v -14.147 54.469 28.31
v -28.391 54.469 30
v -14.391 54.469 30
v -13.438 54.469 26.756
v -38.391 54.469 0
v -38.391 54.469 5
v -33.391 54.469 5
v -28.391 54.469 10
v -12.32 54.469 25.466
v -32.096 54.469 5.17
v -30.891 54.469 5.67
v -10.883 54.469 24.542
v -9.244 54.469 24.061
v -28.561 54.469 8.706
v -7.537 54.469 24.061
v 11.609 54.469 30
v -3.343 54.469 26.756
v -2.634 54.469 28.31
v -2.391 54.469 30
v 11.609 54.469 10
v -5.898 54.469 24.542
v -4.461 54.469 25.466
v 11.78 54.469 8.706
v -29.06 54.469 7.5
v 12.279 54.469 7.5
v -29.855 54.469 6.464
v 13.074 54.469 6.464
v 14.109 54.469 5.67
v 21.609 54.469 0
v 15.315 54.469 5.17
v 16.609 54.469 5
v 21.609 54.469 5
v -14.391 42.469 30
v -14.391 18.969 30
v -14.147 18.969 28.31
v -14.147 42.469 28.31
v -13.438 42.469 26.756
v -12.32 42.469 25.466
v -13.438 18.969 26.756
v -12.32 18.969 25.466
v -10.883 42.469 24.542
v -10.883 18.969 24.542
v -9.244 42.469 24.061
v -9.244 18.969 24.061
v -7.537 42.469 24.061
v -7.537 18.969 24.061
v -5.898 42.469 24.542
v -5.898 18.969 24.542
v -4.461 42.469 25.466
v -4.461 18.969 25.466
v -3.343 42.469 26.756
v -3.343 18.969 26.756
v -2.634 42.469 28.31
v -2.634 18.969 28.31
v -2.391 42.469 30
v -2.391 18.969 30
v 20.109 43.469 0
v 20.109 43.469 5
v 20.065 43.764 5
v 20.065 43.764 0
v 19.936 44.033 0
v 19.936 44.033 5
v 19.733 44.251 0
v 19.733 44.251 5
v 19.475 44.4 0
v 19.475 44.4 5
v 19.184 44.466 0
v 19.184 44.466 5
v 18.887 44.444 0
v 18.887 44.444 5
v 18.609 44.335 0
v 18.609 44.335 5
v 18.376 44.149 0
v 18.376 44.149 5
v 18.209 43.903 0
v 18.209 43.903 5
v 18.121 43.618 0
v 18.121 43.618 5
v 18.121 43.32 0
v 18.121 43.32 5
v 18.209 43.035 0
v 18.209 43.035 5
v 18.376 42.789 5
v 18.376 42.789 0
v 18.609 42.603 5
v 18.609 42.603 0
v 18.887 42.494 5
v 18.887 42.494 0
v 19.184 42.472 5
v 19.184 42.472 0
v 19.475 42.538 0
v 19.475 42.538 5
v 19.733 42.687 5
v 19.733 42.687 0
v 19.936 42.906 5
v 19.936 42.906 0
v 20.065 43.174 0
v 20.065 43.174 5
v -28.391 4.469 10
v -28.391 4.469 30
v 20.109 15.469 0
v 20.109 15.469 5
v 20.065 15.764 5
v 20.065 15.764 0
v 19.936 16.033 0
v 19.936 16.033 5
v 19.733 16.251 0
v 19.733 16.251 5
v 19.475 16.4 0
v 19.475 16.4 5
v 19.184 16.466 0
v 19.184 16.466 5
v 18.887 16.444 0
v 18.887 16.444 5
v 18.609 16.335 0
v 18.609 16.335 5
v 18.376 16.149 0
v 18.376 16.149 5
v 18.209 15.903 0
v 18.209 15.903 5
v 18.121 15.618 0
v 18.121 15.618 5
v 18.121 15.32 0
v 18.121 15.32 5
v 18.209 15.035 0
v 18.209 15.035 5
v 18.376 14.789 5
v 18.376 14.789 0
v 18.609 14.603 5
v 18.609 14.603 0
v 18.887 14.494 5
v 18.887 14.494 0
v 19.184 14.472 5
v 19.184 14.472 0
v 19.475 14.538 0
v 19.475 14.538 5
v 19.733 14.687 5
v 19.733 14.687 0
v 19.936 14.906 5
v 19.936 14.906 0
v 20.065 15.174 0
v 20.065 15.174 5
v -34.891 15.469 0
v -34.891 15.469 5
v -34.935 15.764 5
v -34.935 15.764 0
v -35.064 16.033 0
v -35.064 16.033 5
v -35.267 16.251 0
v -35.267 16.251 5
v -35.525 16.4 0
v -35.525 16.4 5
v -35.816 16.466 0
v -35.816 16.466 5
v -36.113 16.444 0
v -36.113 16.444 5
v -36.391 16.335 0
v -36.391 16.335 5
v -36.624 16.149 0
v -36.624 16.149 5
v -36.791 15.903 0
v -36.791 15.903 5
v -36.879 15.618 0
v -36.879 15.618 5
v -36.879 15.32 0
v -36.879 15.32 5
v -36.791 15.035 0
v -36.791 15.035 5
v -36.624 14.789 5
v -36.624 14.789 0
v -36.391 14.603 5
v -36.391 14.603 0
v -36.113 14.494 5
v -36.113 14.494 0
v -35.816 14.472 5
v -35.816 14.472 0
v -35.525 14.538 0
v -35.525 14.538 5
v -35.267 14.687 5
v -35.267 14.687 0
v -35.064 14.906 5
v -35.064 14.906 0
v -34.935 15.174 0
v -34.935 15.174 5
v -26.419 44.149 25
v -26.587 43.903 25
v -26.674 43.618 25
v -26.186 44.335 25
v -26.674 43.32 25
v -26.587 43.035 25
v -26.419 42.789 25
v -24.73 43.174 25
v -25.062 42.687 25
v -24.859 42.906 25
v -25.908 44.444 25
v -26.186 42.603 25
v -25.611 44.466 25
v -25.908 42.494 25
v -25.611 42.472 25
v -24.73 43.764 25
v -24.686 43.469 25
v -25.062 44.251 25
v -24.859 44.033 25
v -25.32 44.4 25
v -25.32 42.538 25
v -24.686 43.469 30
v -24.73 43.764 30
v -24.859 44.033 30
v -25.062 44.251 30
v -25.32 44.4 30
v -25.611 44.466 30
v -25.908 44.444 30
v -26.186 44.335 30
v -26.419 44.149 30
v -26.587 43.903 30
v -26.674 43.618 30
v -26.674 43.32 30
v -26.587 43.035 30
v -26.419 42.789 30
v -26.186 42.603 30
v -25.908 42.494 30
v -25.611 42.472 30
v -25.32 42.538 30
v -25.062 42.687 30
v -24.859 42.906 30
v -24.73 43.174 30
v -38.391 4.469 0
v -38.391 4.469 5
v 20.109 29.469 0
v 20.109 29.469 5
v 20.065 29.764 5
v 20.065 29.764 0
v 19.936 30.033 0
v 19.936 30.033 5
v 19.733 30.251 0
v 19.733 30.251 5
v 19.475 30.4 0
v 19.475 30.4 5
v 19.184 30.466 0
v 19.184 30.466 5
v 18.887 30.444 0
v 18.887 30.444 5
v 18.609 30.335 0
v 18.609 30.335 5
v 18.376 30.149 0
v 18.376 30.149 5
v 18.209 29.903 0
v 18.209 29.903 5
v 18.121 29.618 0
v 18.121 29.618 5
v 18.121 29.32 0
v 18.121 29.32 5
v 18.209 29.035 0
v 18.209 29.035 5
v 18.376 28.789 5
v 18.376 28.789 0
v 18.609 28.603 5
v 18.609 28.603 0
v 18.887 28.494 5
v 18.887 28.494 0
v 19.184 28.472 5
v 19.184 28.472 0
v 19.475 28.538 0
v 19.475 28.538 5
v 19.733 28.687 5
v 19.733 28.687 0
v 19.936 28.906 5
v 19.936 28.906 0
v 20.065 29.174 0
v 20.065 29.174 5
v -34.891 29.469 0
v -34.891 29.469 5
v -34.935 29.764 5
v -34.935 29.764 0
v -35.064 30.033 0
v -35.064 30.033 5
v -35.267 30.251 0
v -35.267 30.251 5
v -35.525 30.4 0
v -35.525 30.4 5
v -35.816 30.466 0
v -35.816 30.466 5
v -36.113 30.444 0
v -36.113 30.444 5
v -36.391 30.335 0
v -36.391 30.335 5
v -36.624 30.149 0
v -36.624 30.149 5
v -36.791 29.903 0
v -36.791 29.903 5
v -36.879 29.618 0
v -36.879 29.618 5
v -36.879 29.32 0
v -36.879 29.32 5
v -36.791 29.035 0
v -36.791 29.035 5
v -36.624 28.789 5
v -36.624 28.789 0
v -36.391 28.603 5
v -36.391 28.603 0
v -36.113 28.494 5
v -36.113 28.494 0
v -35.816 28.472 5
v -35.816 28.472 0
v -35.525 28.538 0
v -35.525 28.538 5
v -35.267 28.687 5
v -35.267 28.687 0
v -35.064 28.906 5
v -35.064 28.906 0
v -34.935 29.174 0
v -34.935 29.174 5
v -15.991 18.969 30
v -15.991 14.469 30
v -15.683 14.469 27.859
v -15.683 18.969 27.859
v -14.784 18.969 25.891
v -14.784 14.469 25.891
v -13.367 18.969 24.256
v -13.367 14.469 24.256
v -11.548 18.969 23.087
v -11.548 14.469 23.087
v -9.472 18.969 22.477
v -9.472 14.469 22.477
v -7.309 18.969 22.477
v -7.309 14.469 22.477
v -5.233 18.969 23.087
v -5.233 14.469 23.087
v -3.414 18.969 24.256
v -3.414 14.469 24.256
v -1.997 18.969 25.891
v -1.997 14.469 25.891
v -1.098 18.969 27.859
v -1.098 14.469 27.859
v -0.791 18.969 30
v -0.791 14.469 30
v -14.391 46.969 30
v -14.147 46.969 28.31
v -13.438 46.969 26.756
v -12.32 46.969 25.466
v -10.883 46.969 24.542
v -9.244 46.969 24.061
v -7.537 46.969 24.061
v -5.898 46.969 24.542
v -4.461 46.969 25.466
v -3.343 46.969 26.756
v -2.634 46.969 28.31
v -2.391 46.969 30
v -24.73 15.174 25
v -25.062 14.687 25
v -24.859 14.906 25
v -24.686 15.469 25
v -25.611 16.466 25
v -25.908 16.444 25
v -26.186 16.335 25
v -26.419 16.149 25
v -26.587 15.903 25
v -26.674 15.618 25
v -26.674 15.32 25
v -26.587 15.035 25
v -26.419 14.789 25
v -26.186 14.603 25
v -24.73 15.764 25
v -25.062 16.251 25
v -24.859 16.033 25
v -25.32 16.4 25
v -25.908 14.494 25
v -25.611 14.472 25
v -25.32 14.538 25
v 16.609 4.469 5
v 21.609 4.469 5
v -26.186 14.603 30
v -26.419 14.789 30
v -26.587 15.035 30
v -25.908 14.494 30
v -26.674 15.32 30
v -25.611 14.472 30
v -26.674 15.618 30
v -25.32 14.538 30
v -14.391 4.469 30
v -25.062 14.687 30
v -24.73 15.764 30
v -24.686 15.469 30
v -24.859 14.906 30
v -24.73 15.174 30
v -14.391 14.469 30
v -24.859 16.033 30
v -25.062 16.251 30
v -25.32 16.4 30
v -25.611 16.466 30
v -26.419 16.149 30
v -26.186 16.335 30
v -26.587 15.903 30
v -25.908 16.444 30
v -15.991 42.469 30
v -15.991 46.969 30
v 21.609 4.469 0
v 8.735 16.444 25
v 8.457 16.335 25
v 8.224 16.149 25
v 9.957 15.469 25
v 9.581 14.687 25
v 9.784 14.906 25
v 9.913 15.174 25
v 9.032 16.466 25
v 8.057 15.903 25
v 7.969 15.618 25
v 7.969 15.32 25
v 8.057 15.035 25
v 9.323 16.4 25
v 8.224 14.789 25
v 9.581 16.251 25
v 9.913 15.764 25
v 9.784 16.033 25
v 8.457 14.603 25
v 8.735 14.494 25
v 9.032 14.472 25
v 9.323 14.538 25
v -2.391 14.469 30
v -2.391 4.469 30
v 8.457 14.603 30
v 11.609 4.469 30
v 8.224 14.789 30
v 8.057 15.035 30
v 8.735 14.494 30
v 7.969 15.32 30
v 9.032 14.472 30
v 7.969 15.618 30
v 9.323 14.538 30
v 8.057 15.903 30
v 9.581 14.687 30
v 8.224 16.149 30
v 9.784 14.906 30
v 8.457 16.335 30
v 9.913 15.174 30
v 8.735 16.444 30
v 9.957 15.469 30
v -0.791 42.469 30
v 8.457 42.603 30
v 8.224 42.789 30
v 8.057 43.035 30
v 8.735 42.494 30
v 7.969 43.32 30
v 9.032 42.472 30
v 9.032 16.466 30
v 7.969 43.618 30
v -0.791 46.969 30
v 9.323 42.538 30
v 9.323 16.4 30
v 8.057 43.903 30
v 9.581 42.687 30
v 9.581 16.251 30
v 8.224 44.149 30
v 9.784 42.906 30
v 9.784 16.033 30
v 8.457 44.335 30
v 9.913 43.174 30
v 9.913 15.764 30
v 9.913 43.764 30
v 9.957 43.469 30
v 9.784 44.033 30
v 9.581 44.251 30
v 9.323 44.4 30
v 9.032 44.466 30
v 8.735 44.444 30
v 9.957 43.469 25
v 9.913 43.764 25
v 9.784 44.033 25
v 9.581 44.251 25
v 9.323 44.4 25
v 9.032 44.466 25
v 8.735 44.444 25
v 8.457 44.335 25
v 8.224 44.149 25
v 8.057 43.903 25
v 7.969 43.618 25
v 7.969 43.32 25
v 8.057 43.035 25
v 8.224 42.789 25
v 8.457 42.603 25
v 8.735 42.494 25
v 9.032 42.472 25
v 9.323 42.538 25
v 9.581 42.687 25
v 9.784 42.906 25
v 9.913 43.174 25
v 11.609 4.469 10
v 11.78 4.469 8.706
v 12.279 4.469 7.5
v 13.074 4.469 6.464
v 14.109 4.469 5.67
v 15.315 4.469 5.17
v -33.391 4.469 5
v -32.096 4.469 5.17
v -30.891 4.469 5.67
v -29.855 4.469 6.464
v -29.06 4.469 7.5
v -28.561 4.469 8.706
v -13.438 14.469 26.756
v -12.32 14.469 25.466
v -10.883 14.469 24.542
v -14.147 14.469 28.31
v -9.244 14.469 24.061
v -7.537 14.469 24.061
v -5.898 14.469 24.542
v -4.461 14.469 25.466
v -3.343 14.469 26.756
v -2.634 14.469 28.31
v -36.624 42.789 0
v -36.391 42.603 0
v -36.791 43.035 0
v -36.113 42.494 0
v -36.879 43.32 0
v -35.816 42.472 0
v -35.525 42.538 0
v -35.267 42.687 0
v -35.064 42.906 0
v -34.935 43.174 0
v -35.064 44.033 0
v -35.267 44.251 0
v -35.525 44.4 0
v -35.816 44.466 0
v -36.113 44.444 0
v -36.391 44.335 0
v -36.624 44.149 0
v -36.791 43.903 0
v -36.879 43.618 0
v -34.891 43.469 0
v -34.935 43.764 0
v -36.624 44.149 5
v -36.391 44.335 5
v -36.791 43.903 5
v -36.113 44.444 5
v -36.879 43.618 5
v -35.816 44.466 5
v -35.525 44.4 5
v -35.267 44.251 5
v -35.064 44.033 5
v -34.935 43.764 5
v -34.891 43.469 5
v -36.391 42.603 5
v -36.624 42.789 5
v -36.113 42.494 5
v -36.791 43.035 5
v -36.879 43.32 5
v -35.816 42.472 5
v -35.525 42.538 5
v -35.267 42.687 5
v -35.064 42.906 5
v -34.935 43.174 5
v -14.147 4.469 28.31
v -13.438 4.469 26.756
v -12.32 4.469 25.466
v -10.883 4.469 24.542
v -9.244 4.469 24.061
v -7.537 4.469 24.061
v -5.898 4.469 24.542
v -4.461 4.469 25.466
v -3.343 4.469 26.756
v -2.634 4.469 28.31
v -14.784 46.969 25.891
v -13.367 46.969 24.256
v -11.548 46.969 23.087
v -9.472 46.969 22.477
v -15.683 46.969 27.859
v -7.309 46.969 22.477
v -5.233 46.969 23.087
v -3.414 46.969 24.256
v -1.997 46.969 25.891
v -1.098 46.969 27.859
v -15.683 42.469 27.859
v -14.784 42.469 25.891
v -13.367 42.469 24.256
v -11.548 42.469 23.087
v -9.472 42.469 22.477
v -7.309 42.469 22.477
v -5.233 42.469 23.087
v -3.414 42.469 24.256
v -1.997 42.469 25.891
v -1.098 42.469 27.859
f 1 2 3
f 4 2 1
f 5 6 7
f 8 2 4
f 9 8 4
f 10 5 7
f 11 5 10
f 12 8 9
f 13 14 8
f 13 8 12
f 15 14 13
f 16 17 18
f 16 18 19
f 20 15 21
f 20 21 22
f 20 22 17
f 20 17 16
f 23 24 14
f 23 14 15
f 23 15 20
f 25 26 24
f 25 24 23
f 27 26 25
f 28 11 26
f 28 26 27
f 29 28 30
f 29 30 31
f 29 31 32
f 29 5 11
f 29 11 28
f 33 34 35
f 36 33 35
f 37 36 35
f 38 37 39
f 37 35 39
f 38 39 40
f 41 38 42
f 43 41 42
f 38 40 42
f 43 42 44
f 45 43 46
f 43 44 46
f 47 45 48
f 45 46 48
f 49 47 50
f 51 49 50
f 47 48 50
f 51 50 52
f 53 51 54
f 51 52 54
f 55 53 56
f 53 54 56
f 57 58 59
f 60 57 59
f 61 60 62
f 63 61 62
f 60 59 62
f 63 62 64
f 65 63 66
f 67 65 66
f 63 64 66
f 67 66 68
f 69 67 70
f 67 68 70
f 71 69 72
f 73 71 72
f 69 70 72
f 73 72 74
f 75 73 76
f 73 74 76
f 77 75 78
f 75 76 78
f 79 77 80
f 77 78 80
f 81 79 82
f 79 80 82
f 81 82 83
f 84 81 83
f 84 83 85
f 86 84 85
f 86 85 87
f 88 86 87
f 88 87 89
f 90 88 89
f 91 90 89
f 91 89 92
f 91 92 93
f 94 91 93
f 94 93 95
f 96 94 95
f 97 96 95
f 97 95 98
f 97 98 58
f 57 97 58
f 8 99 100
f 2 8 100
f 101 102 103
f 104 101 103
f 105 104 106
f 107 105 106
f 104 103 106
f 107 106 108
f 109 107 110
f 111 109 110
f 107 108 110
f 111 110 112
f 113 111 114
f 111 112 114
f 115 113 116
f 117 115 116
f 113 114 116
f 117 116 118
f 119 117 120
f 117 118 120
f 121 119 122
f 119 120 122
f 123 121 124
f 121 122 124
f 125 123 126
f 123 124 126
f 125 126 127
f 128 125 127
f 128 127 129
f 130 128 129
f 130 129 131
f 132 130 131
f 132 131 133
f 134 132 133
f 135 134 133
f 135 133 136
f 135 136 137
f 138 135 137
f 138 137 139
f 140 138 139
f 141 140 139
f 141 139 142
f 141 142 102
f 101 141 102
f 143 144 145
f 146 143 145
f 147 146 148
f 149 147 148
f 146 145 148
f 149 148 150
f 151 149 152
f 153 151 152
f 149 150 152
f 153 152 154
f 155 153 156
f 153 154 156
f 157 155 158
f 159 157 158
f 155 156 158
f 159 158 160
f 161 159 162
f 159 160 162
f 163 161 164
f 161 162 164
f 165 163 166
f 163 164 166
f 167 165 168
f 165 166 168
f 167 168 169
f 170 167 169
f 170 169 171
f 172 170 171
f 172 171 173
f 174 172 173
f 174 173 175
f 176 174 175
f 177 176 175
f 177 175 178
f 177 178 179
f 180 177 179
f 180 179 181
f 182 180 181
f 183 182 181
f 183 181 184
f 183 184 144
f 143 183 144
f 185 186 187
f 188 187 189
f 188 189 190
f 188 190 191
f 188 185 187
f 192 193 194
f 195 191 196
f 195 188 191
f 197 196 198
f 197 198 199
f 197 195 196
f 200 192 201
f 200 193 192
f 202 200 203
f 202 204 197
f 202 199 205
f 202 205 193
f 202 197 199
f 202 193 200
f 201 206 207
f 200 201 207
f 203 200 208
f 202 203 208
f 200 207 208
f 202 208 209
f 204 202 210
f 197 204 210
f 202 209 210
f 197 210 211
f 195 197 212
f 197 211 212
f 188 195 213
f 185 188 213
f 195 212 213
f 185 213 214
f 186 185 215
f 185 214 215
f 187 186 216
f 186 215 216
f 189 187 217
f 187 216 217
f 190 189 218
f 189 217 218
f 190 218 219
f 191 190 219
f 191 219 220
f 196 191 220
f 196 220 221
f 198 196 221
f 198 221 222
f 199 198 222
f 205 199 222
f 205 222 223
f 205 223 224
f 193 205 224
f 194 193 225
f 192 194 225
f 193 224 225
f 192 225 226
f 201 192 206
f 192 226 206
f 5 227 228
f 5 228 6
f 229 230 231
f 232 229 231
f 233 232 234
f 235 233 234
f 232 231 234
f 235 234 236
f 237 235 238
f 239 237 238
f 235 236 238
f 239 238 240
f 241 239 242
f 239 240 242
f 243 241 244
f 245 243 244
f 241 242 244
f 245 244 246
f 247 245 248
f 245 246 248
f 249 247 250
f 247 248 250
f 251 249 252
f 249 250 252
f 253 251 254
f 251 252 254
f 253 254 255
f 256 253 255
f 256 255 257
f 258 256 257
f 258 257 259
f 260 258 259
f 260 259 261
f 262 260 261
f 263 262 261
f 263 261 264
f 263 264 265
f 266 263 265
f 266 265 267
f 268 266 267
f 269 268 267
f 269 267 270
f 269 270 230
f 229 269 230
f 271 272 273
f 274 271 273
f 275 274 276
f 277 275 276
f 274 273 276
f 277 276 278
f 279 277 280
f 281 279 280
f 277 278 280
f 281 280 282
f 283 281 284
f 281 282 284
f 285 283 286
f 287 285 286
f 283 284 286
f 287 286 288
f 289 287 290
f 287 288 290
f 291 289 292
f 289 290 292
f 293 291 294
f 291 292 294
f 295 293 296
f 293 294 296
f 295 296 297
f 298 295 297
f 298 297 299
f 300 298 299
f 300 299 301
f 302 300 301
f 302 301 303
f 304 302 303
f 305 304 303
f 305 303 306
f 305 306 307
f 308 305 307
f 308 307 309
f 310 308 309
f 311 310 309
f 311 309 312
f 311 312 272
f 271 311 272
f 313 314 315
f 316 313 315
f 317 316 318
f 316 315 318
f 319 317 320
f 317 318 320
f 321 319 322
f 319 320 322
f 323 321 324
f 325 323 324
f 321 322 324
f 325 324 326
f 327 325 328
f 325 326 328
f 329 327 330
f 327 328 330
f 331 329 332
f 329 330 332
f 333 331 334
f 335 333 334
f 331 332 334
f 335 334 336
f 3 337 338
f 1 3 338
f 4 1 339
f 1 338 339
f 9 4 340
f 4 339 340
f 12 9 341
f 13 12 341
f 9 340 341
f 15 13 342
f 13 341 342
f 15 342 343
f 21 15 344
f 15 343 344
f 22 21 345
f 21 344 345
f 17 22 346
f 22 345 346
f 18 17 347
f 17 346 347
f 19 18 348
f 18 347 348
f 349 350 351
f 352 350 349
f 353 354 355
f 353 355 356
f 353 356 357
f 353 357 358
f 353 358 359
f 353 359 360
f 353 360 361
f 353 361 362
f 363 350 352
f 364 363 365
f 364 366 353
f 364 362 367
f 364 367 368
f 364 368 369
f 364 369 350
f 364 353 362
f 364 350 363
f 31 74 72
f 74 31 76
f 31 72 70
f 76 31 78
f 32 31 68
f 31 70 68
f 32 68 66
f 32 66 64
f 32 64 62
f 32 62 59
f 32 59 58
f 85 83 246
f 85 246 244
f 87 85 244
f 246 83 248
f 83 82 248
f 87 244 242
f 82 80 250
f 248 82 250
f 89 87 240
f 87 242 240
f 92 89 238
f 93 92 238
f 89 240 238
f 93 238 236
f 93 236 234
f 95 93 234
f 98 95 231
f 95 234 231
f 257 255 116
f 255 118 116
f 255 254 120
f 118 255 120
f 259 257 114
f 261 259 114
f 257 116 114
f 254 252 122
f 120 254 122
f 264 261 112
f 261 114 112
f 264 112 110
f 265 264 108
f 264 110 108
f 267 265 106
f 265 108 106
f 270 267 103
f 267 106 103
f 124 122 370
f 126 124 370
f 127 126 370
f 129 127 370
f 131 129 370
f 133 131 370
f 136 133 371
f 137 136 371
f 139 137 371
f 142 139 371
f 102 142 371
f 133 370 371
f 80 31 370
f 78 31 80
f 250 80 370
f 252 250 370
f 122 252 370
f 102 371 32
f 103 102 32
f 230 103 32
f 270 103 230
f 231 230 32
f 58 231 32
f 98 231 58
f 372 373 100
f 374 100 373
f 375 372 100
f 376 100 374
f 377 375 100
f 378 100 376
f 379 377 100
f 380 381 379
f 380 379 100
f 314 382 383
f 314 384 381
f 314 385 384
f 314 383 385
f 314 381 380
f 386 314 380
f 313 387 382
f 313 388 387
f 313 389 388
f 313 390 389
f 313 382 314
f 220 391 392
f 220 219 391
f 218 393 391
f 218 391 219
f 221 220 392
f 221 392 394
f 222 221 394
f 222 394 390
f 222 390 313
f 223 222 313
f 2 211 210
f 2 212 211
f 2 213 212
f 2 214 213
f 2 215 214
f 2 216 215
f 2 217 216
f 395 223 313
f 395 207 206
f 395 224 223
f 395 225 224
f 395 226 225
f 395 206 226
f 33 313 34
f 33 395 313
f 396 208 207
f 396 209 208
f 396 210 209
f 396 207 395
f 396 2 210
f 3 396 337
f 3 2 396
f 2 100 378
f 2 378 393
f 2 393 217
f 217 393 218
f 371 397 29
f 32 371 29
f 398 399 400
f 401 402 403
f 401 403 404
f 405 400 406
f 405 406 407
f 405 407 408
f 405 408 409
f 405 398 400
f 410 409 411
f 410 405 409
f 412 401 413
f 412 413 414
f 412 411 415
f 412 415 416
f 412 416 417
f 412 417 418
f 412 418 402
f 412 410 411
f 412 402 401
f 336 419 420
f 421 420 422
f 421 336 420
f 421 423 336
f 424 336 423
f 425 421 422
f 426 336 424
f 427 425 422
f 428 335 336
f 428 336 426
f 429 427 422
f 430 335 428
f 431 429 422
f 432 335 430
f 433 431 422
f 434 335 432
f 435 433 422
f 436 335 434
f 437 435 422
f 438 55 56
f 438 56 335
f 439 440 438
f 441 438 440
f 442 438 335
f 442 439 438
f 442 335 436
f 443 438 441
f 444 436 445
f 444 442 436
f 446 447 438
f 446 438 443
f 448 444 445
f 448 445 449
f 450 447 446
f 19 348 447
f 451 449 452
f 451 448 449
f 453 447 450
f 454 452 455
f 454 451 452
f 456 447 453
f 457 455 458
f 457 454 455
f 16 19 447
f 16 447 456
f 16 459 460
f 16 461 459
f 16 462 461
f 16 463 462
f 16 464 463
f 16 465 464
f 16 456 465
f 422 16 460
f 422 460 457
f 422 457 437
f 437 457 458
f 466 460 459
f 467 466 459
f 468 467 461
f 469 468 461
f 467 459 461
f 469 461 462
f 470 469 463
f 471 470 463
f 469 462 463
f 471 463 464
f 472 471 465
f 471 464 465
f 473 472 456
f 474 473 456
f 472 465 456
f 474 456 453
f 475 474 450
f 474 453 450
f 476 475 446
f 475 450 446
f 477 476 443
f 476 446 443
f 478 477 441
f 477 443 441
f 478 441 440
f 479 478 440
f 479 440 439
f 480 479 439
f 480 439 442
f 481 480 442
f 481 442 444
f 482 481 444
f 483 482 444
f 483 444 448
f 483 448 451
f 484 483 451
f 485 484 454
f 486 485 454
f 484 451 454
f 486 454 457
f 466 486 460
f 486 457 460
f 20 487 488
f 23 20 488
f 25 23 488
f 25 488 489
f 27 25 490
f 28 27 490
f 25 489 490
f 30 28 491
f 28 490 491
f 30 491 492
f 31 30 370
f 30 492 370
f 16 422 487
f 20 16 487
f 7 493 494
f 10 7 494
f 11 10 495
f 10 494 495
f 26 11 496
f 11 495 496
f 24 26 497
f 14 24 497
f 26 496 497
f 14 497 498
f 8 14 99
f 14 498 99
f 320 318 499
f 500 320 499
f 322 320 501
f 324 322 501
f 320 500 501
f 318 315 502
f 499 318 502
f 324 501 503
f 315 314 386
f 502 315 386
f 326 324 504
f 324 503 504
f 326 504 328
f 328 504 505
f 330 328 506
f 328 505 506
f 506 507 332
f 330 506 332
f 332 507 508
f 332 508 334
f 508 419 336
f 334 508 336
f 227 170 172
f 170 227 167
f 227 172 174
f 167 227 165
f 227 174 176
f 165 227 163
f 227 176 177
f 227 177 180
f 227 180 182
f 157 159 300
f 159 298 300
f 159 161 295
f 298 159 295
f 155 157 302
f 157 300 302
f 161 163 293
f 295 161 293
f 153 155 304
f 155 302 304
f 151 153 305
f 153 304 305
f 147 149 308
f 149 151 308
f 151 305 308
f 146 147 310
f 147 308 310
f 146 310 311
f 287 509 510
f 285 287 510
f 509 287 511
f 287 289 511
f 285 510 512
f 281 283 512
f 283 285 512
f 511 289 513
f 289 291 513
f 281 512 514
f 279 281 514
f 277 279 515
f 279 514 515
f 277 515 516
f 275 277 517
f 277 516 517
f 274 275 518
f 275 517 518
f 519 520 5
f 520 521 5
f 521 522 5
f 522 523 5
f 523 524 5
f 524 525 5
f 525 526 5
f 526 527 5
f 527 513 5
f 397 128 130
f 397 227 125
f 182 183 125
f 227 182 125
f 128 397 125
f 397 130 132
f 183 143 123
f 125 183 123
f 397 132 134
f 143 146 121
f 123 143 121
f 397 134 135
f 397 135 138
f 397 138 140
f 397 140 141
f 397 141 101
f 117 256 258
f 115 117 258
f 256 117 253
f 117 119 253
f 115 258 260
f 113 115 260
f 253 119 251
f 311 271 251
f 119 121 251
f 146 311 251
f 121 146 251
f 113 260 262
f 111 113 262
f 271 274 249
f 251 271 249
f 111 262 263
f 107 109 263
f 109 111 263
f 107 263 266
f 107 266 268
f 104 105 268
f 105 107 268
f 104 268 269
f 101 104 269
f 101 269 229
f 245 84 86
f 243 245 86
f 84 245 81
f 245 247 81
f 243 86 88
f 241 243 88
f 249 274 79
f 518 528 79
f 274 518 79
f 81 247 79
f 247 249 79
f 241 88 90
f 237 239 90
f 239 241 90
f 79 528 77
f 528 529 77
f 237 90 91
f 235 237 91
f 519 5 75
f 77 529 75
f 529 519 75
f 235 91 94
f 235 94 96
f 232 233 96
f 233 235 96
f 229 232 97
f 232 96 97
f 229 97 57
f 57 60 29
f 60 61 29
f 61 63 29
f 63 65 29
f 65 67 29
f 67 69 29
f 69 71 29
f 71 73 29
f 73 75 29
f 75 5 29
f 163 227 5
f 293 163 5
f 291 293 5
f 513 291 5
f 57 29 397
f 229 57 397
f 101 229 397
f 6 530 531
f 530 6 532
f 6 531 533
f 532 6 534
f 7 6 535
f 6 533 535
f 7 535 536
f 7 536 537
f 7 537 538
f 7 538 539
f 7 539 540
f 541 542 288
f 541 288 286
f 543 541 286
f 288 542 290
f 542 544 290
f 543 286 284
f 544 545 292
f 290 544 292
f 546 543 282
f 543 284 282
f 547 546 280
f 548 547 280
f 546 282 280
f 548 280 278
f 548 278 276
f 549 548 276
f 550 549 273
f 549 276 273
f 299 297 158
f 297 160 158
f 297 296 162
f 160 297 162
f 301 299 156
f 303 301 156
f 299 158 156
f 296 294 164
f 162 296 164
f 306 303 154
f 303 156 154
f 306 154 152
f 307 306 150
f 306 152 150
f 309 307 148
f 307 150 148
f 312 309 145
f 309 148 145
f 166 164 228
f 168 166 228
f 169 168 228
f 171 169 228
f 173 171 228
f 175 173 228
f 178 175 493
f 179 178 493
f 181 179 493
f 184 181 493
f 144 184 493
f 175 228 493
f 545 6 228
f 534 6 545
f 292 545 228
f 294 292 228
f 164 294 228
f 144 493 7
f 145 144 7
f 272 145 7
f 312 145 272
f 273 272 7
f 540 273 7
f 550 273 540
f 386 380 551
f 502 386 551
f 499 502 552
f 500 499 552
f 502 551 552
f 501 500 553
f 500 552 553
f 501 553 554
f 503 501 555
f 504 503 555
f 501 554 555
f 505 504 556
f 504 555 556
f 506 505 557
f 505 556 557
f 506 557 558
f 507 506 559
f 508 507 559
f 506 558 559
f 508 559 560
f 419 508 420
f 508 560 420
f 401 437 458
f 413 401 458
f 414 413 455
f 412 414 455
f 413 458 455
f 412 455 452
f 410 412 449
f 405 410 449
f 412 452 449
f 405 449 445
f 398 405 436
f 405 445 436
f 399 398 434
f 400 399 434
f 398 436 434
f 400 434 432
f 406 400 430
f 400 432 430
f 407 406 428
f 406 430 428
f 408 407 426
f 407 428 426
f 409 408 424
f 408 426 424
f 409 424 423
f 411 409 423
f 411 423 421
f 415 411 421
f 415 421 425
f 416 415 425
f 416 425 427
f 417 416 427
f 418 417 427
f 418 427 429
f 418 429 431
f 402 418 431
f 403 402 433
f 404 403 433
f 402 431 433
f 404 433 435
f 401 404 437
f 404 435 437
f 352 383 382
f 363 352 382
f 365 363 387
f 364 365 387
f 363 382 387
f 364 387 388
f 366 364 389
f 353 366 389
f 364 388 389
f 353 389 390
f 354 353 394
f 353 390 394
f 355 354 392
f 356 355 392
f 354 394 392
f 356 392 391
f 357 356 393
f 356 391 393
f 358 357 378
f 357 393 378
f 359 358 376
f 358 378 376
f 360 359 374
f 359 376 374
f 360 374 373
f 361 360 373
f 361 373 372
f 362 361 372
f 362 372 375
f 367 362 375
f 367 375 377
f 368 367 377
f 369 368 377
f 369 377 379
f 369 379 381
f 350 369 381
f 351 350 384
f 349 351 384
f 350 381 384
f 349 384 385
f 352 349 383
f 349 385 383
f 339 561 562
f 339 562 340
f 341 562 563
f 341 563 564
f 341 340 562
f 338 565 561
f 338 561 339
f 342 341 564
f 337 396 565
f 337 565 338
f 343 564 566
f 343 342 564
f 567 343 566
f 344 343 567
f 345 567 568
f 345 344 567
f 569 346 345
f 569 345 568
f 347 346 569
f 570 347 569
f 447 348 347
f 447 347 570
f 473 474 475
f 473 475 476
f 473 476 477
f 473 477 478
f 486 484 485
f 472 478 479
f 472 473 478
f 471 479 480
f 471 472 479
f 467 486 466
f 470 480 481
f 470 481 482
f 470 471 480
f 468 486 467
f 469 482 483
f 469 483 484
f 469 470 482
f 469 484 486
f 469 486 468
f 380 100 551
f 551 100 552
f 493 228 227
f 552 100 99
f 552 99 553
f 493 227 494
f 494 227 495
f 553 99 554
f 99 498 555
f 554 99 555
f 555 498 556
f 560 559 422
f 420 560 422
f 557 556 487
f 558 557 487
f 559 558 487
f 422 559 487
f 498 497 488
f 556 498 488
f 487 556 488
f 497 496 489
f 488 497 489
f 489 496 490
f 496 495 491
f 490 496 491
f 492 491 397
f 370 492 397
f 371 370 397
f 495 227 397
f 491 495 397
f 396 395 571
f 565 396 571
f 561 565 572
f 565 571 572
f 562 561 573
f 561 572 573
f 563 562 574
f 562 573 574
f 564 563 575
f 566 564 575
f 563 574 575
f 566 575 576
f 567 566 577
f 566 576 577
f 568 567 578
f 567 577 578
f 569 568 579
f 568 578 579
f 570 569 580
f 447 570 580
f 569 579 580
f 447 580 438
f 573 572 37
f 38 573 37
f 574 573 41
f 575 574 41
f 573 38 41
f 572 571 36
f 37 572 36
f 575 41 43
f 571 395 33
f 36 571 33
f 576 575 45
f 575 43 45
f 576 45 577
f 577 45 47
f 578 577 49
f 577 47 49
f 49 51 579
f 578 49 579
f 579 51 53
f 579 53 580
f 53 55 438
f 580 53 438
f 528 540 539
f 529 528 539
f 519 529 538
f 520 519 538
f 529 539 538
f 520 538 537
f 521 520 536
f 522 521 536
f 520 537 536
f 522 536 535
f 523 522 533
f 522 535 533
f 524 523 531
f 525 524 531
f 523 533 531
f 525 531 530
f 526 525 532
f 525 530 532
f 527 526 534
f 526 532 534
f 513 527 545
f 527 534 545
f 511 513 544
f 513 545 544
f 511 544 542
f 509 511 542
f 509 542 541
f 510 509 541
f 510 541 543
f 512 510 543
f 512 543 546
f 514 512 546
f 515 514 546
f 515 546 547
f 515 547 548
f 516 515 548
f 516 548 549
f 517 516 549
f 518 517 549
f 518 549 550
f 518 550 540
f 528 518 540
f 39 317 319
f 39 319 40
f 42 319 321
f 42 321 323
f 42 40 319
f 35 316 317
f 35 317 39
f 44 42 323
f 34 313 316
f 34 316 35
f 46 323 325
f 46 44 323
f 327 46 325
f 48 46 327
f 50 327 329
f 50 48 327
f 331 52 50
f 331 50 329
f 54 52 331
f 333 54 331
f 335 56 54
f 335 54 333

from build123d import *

# Parameters (mm, degrees)
F0_W      = 60
F0_H      = 50
F1_DEPTH  = 30
F3_R      = 6
F4_DEPTH  = 90
F6_R      = 7.6
F7_DEPTH  = 4.5
F8_START  = -28
F8_DEPTH  = 4.5
F10_R     = 1
F11_DEPTH = 25
F12_R     = 1
F13_DEPTH = 5


with BuildPart() as f1:
    # F0 (on Top) → F1 (new body)
    with BuildSketch(Plane.XY):
        with Locations((-8.3905272186, 29.4691909945)):
            Rectangle(F0_W, F0_H)
    extrude(amount=F1_DEPTH)

    # F3 (on face) → F4 (cut)
    with BuildSketch(Plane.XZ.offset(-4.4691909945)):
        with Locations((-8.3905272186, 30)):
            Circle(F3_R)
        with BuildLine():
            Line((-28.3905272186, 10), (-28.3905272186, 30))
            Line((-28.3905272186, 30), (-38.3905272186, 30))
            Line((-38.3905272186, 30), (-38.3905272186, 5))
            Line((-38.3905272186, 5), (-33.3905272186, 5))
            ThreePointArc((-33.3905272186, 5), (-29.8549933126, 6.4644660941), (-28.3905272186, 10))
        make_face()
        with BuildLine():
            Line((21.6094727814, 5), (21.6094727814, 30))
            Line((21.6094727814, 30), (11.6094727814, 30))
            Line((11.6094727814, 30), (11.6094727814, 10))
            ThreePointArc((11.6094727814, 10), (13.0739388755, 6.4644660941), (16.6094727814, 5))
            Line((16.6094727814, 5), (21.6094727814, 5))
        make_face()
    extrude(amount=-F4_DEPTH, mode=Mode.SUBTRACT)

    # F6 (on offset) → F7 (cut)
    with BuildSketch(Plane.XZ.offset(-14.4691909945)):
        with Locations((-8.3905272186, 30)):
            Circle(F6_R)
    extrude(amount=-F7_DEPTH, mode=Mode.SUBTRACT)

    # F6 (on offset) → F8 (cut)
    with BuildSketch(Plane.XZ.offset(-14.4691909945).offset(F8_START)):
        with Locations((-8.3905272186, 30)):
            Circle(F6_R)
    extrude(amount=-F8_DEPTH, mode=Mode.SUBTRACT)

    # F10 (on face) → F11 (cut)
    with BuildSketch(Plane.XY.offset(5)):
        with Locations((19.1094727814, 15.4691909945)):
            Circle(F10_R)
        with Locations((19.1094727814, 43.4691909945)):
            Circle(F10_R)
        with Locations((19.1094727814, 29.4691909945)):
            Circle(F10_R)
        with Locations((-35.8905272186, 15.4691909945)):
            Circle(F10_R)
        with Locations((-35.8905272186, 29.4691909945)):
            Circle(F10_R)
        with Locations((-35.8905272186, 43.4691909945)):
            Circle(F10_R)
    extrude(amount=-F11_DEPTH, mode=Mode.SUBTRACT)

    # F12 (on face) → F13 (cut)
    with BuildSketch(Plane.XY.offset(30)):
        with Locations((8.9574727814, 43.4691909945)):
            Circle(F12_R)
        with Locations((8.9574727814, 15.4691909945)):
            Circle(F12_R)
        with Locations((-25.6856481384, 15.4691909945)):
            Circle(F12_R)
        with Locations((-25.6856481384, 43.4691909945)):
            Circle(F12_R)
    extrude(amount=-F13_DEPTH, mode=Mode.SUBTRACT)


solid = f1.part
